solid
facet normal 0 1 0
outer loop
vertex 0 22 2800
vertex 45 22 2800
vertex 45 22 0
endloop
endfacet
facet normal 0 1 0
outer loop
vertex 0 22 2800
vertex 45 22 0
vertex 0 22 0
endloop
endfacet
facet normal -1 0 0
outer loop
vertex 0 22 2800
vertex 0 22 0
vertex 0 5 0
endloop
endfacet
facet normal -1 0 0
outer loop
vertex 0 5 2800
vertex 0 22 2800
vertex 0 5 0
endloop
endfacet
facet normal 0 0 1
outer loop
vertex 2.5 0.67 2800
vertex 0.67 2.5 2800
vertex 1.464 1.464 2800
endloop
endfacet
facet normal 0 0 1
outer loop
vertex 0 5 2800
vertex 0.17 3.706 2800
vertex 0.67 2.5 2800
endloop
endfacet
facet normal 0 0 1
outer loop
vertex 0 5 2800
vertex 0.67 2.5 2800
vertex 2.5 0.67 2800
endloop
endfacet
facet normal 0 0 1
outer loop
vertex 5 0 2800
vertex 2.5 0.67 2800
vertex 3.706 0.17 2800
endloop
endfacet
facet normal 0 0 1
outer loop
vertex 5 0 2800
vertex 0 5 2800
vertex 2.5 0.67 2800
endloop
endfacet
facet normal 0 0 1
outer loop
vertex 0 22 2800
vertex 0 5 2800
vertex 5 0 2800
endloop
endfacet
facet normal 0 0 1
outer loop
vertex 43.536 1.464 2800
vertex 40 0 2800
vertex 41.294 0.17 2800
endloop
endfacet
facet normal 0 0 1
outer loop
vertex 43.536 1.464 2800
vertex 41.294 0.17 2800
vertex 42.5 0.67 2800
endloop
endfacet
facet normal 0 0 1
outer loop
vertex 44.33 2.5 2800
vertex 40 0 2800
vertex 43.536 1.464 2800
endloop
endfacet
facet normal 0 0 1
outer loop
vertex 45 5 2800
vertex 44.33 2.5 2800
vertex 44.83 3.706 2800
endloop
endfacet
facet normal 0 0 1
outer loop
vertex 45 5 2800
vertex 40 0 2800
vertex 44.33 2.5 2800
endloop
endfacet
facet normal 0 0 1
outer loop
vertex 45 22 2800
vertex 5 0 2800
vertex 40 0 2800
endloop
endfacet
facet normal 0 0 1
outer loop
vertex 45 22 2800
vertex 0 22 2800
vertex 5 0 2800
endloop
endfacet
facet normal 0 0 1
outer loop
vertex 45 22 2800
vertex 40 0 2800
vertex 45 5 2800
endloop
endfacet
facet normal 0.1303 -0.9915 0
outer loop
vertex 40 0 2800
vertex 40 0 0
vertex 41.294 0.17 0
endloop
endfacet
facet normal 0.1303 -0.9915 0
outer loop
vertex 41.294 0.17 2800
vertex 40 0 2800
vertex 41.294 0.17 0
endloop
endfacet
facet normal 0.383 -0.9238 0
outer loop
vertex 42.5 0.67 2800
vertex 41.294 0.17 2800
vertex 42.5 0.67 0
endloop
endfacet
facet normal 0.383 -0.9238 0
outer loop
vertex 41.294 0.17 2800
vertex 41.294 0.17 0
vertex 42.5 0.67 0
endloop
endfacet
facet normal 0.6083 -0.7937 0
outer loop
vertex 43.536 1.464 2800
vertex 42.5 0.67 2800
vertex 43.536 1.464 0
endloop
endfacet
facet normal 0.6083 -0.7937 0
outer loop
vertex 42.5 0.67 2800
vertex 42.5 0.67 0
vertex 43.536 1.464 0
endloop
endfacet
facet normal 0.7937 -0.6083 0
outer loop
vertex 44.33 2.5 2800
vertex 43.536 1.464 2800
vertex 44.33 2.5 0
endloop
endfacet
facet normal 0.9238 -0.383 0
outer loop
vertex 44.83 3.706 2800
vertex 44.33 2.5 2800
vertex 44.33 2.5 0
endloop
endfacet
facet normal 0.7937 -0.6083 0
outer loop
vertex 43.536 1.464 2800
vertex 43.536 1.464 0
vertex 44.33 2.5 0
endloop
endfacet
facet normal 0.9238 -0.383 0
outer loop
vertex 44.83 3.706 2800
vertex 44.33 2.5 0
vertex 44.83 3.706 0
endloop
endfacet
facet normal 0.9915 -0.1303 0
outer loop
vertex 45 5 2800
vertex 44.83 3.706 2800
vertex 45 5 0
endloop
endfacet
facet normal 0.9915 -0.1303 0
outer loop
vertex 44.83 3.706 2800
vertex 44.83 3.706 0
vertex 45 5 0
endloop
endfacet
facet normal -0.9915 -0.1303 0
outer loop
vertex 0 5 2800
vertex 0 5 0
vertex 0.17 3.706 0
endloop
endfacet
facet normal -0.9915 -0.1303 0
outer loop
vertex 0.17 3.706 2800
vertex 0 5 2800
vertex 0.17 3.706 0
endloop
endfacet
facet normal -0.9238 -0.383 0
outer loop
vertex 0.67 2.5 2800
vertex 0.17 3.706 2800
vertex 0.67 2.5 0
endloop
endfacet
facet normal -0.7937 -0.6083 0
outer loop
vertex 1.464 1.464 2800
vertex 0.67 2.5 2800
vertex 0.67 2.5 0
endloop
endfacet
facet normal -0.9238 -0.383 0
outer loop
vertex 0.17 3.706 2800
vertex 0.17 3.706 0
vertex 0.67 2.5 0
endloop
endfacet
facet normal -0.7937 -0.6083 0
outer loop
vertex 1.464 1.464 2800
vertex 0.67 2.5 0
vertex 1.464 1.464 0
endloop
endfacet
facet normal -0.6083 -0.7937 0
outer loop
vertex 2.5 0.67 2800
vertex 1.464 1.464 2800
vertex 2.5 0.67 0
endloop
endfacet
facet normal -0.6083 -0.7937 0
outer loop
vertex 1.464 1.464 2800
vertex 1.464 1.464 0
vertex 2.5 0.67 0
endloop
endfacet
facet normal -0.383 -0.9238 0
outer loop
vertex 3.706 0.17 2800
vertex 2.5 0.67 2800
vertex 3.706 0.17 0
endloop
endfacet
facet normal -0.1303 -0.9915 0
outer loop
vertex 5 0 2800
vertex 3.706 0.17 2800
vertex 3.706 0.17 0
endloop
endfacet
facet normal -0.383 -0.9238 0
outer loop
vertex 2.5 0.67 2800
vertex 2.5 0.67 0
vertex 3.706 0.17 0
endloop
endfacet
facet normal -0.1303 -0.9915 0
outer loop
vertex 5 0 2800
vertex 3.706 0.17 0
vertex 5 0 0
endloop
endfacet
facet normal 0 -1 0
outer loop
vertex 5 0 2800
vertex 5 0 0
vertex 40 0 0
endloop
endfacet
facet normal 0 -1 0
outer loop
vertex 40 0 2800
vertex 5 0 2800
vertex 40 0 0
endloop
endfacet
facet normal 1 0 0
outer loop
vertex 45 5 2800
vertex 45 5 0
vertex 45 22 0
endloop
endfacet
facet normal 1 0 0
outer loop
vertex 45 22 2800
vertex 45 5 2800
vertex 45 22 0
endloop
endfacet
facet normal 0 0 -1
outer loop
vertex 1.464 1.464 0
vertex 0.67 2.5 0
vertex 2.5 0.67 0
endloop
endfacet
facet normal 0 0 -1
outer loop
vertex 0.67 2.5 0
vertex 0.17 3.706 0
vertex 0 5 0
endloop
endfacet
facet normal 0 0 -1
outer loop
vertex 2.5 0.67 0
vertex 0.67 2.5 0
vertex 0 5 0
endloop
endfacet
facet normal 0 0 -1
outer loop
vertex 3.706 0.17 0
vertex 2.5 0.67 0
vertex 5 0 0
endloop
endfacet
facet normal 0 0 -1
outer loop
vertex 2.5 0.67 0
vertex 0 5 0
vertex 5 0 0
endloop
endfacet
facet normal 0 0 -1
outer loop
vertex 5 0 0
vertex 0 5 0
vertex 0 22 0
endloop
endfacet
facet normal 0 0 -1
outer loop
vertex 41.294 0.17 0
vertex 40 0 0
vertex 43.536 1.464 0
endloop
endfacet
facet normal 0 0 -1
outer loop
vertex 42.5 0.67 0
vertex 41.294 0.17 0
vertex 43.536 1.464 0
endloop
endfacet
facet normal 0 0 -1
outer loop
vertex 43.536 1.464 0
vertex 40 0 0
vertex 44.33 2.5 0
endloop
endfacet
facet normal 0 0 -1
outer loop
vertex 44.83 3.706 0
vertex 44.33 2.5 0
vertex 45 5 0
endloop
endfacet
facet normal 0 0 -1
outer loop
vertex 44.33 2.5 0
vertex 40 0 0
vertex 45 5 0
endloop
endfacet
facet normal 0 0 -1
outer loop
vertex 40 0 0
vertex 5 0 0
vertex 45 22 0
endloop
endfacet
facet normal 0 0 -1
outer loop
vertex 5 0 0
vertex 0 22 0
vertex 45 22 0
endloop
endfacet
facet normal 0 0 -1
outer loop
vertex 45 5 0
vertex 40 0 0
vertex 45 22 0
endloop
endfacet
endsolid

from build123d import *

# Parameters (mm, degrees)
F1_DEPTH = 2800


with BuildPart() as f1:
    # F0 (on Top) → F1 (new body)
    with BuildSketch(Plane.XY):
        with BuildLine():
            ThreePointArc((0, 5), (1.464466, 1.464466), (5, 0))
            Line((5, 0), (40, 0))
            ThreePointArc((40, 0), (43.535534, 1.464466), (45, 5))
            Line((45, 5), (45, 22))
            Line((45, 22), (0, 22))
            Line((0, 22), (0, 5))
        make_face()
    extrude(amount=F1_DEPTH)


solid = f1.part
